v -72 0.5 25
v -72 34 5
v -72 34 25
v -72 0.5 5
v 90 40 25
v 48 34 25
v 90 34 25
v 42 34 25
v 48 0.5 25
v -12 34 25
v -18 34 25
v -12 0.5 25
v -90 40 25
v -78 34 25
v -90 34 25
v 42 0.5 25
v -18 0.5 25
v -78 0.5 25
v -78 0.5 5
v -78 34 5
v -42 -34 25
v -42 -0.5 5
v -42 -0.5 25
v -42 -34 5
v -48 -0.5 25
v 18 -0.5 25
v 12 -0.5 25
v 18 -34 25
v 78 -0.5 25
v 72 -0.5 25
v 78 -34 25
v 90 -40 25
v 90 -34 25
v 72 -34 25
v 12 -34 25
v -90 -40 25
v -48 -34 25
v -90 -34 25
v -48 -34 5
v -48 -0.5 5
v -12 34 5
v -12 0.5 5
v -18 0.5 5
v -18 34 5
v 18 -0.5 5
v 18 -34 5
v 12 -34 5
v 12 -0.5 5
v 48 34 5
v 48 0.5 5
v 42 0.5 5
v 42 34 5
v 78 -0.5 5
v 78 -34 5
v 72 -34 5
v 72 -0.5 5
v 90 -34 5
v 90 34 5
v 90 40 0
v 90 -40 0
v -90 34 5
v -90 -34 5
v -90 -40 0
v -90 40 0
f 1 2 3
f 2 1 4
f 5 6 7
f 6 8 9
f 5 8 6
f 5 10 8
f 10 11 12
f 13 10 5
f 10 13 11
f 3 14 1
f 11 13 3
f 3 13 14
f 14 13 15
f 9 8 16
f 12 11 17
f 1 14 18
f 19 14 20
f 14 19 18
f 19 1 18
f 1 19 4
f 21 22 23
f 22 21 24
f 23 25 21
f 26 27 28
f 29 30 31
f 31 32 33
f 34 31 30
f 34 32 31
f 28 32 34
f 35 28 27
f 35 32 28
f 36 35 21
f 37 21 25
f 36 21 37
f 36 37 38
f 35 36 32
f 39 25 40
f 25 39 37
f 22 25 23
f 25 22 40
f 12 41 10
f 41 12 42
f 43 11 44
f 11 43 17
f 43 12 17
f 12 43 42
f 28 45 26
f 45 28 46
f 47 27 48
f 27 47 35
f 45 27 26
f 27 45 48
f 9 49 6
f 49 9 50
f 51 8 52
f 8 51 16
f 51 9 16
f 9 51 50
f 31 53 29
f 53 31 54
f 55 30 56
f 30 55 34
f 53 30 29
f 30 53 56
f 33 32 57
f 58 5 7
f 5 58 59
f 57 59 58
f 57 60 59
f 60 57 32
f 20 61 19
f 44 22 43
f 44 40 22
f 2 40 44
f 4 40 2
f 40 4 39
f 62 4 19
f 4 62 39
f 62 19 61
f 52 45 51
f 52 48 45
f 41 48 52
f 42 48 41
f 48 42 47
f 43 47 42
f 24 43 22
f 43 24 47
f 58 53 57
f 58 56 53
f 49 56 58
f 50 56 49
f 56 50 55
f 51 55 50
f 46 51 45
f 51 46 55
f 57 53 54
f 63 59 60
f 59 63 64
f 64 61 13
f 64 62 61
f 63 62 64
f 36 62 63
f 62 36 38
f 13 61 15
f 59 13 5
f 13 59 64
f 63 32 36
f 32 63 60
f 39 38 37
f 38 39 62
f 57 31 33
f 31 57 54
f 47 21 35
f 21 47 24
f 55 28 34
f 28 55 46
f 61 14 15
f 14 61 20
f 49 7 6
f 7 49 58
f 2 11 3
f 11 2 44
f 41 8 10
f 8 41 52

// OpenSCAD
$fn = 32;

// ----------------------------------------------------------------------
// Rib frame 180 x 80 x 25
// 6 ribs at 30 mm pitch, staggered
// ----------------------------------------------------------------------

// --- parameters (mm) ---
frame = [180, 80, 5];  // base plate size (x, y, z)
rail_w = 6;            // side rail width
ribs = 6;              // number of ribs
rib_t = 6;             // rib thickness
rib_h = 20;            // rib height above the base plate
pitch = 30;            // pitch between rib centres

// --- derived feature positions (mm) ---
span = (ribs - 1) * pitch;          // = 150   distance between the outer ribs
origin_x = -span / 2;               // = -75   X of the first rib
rib_len = frame[1] / 2 - rail_w + 0.5;  // = 34.5   length of a staggered rib
rib_y = 0.5 + rib_len / 2;          // = 17.75   Y of a staggered rib centre
row_offset = 2 * rib_y;             // = 35.5   distance between the two rows
feature_centers = [
  [origin_x + 0 * pitch, rib_y],
  [origin_x + 1 * pitch, -rib_y],
  [origin_x + 2 * pitch, rib_y],
  [origin_x + 3 * pitch, -rib_y],
  [origin_x + 4 * pitch, rib_y],
  [origin_x + 5 * pitch, -rib_y]
];   // rib centre line, drives the rib loop

// base plate, two side rails, then the ribs read straight off feature_centers
union() {
  translate([-frame[0] / 2, -frame[1] / 2, 0]) cube(frame);
  translate([-frame[0] / 2, -frame[1] / 2, 0]) cube([frame[0], rail_w, frame[2] + rib_h]);
  translate([-frame[0] / 2, frame[1] / 2 - rail_w, 0]) cube([frame[0], rail_w, frame[2] + rib_h]);
  for (centre = feature_centers)
    translate([centre[0] - rib_t / 2, centre[1] - rib_len / 2, frame[2] - 1])
      cube([rib_t, rib_len, rib_h + 1]);
}
